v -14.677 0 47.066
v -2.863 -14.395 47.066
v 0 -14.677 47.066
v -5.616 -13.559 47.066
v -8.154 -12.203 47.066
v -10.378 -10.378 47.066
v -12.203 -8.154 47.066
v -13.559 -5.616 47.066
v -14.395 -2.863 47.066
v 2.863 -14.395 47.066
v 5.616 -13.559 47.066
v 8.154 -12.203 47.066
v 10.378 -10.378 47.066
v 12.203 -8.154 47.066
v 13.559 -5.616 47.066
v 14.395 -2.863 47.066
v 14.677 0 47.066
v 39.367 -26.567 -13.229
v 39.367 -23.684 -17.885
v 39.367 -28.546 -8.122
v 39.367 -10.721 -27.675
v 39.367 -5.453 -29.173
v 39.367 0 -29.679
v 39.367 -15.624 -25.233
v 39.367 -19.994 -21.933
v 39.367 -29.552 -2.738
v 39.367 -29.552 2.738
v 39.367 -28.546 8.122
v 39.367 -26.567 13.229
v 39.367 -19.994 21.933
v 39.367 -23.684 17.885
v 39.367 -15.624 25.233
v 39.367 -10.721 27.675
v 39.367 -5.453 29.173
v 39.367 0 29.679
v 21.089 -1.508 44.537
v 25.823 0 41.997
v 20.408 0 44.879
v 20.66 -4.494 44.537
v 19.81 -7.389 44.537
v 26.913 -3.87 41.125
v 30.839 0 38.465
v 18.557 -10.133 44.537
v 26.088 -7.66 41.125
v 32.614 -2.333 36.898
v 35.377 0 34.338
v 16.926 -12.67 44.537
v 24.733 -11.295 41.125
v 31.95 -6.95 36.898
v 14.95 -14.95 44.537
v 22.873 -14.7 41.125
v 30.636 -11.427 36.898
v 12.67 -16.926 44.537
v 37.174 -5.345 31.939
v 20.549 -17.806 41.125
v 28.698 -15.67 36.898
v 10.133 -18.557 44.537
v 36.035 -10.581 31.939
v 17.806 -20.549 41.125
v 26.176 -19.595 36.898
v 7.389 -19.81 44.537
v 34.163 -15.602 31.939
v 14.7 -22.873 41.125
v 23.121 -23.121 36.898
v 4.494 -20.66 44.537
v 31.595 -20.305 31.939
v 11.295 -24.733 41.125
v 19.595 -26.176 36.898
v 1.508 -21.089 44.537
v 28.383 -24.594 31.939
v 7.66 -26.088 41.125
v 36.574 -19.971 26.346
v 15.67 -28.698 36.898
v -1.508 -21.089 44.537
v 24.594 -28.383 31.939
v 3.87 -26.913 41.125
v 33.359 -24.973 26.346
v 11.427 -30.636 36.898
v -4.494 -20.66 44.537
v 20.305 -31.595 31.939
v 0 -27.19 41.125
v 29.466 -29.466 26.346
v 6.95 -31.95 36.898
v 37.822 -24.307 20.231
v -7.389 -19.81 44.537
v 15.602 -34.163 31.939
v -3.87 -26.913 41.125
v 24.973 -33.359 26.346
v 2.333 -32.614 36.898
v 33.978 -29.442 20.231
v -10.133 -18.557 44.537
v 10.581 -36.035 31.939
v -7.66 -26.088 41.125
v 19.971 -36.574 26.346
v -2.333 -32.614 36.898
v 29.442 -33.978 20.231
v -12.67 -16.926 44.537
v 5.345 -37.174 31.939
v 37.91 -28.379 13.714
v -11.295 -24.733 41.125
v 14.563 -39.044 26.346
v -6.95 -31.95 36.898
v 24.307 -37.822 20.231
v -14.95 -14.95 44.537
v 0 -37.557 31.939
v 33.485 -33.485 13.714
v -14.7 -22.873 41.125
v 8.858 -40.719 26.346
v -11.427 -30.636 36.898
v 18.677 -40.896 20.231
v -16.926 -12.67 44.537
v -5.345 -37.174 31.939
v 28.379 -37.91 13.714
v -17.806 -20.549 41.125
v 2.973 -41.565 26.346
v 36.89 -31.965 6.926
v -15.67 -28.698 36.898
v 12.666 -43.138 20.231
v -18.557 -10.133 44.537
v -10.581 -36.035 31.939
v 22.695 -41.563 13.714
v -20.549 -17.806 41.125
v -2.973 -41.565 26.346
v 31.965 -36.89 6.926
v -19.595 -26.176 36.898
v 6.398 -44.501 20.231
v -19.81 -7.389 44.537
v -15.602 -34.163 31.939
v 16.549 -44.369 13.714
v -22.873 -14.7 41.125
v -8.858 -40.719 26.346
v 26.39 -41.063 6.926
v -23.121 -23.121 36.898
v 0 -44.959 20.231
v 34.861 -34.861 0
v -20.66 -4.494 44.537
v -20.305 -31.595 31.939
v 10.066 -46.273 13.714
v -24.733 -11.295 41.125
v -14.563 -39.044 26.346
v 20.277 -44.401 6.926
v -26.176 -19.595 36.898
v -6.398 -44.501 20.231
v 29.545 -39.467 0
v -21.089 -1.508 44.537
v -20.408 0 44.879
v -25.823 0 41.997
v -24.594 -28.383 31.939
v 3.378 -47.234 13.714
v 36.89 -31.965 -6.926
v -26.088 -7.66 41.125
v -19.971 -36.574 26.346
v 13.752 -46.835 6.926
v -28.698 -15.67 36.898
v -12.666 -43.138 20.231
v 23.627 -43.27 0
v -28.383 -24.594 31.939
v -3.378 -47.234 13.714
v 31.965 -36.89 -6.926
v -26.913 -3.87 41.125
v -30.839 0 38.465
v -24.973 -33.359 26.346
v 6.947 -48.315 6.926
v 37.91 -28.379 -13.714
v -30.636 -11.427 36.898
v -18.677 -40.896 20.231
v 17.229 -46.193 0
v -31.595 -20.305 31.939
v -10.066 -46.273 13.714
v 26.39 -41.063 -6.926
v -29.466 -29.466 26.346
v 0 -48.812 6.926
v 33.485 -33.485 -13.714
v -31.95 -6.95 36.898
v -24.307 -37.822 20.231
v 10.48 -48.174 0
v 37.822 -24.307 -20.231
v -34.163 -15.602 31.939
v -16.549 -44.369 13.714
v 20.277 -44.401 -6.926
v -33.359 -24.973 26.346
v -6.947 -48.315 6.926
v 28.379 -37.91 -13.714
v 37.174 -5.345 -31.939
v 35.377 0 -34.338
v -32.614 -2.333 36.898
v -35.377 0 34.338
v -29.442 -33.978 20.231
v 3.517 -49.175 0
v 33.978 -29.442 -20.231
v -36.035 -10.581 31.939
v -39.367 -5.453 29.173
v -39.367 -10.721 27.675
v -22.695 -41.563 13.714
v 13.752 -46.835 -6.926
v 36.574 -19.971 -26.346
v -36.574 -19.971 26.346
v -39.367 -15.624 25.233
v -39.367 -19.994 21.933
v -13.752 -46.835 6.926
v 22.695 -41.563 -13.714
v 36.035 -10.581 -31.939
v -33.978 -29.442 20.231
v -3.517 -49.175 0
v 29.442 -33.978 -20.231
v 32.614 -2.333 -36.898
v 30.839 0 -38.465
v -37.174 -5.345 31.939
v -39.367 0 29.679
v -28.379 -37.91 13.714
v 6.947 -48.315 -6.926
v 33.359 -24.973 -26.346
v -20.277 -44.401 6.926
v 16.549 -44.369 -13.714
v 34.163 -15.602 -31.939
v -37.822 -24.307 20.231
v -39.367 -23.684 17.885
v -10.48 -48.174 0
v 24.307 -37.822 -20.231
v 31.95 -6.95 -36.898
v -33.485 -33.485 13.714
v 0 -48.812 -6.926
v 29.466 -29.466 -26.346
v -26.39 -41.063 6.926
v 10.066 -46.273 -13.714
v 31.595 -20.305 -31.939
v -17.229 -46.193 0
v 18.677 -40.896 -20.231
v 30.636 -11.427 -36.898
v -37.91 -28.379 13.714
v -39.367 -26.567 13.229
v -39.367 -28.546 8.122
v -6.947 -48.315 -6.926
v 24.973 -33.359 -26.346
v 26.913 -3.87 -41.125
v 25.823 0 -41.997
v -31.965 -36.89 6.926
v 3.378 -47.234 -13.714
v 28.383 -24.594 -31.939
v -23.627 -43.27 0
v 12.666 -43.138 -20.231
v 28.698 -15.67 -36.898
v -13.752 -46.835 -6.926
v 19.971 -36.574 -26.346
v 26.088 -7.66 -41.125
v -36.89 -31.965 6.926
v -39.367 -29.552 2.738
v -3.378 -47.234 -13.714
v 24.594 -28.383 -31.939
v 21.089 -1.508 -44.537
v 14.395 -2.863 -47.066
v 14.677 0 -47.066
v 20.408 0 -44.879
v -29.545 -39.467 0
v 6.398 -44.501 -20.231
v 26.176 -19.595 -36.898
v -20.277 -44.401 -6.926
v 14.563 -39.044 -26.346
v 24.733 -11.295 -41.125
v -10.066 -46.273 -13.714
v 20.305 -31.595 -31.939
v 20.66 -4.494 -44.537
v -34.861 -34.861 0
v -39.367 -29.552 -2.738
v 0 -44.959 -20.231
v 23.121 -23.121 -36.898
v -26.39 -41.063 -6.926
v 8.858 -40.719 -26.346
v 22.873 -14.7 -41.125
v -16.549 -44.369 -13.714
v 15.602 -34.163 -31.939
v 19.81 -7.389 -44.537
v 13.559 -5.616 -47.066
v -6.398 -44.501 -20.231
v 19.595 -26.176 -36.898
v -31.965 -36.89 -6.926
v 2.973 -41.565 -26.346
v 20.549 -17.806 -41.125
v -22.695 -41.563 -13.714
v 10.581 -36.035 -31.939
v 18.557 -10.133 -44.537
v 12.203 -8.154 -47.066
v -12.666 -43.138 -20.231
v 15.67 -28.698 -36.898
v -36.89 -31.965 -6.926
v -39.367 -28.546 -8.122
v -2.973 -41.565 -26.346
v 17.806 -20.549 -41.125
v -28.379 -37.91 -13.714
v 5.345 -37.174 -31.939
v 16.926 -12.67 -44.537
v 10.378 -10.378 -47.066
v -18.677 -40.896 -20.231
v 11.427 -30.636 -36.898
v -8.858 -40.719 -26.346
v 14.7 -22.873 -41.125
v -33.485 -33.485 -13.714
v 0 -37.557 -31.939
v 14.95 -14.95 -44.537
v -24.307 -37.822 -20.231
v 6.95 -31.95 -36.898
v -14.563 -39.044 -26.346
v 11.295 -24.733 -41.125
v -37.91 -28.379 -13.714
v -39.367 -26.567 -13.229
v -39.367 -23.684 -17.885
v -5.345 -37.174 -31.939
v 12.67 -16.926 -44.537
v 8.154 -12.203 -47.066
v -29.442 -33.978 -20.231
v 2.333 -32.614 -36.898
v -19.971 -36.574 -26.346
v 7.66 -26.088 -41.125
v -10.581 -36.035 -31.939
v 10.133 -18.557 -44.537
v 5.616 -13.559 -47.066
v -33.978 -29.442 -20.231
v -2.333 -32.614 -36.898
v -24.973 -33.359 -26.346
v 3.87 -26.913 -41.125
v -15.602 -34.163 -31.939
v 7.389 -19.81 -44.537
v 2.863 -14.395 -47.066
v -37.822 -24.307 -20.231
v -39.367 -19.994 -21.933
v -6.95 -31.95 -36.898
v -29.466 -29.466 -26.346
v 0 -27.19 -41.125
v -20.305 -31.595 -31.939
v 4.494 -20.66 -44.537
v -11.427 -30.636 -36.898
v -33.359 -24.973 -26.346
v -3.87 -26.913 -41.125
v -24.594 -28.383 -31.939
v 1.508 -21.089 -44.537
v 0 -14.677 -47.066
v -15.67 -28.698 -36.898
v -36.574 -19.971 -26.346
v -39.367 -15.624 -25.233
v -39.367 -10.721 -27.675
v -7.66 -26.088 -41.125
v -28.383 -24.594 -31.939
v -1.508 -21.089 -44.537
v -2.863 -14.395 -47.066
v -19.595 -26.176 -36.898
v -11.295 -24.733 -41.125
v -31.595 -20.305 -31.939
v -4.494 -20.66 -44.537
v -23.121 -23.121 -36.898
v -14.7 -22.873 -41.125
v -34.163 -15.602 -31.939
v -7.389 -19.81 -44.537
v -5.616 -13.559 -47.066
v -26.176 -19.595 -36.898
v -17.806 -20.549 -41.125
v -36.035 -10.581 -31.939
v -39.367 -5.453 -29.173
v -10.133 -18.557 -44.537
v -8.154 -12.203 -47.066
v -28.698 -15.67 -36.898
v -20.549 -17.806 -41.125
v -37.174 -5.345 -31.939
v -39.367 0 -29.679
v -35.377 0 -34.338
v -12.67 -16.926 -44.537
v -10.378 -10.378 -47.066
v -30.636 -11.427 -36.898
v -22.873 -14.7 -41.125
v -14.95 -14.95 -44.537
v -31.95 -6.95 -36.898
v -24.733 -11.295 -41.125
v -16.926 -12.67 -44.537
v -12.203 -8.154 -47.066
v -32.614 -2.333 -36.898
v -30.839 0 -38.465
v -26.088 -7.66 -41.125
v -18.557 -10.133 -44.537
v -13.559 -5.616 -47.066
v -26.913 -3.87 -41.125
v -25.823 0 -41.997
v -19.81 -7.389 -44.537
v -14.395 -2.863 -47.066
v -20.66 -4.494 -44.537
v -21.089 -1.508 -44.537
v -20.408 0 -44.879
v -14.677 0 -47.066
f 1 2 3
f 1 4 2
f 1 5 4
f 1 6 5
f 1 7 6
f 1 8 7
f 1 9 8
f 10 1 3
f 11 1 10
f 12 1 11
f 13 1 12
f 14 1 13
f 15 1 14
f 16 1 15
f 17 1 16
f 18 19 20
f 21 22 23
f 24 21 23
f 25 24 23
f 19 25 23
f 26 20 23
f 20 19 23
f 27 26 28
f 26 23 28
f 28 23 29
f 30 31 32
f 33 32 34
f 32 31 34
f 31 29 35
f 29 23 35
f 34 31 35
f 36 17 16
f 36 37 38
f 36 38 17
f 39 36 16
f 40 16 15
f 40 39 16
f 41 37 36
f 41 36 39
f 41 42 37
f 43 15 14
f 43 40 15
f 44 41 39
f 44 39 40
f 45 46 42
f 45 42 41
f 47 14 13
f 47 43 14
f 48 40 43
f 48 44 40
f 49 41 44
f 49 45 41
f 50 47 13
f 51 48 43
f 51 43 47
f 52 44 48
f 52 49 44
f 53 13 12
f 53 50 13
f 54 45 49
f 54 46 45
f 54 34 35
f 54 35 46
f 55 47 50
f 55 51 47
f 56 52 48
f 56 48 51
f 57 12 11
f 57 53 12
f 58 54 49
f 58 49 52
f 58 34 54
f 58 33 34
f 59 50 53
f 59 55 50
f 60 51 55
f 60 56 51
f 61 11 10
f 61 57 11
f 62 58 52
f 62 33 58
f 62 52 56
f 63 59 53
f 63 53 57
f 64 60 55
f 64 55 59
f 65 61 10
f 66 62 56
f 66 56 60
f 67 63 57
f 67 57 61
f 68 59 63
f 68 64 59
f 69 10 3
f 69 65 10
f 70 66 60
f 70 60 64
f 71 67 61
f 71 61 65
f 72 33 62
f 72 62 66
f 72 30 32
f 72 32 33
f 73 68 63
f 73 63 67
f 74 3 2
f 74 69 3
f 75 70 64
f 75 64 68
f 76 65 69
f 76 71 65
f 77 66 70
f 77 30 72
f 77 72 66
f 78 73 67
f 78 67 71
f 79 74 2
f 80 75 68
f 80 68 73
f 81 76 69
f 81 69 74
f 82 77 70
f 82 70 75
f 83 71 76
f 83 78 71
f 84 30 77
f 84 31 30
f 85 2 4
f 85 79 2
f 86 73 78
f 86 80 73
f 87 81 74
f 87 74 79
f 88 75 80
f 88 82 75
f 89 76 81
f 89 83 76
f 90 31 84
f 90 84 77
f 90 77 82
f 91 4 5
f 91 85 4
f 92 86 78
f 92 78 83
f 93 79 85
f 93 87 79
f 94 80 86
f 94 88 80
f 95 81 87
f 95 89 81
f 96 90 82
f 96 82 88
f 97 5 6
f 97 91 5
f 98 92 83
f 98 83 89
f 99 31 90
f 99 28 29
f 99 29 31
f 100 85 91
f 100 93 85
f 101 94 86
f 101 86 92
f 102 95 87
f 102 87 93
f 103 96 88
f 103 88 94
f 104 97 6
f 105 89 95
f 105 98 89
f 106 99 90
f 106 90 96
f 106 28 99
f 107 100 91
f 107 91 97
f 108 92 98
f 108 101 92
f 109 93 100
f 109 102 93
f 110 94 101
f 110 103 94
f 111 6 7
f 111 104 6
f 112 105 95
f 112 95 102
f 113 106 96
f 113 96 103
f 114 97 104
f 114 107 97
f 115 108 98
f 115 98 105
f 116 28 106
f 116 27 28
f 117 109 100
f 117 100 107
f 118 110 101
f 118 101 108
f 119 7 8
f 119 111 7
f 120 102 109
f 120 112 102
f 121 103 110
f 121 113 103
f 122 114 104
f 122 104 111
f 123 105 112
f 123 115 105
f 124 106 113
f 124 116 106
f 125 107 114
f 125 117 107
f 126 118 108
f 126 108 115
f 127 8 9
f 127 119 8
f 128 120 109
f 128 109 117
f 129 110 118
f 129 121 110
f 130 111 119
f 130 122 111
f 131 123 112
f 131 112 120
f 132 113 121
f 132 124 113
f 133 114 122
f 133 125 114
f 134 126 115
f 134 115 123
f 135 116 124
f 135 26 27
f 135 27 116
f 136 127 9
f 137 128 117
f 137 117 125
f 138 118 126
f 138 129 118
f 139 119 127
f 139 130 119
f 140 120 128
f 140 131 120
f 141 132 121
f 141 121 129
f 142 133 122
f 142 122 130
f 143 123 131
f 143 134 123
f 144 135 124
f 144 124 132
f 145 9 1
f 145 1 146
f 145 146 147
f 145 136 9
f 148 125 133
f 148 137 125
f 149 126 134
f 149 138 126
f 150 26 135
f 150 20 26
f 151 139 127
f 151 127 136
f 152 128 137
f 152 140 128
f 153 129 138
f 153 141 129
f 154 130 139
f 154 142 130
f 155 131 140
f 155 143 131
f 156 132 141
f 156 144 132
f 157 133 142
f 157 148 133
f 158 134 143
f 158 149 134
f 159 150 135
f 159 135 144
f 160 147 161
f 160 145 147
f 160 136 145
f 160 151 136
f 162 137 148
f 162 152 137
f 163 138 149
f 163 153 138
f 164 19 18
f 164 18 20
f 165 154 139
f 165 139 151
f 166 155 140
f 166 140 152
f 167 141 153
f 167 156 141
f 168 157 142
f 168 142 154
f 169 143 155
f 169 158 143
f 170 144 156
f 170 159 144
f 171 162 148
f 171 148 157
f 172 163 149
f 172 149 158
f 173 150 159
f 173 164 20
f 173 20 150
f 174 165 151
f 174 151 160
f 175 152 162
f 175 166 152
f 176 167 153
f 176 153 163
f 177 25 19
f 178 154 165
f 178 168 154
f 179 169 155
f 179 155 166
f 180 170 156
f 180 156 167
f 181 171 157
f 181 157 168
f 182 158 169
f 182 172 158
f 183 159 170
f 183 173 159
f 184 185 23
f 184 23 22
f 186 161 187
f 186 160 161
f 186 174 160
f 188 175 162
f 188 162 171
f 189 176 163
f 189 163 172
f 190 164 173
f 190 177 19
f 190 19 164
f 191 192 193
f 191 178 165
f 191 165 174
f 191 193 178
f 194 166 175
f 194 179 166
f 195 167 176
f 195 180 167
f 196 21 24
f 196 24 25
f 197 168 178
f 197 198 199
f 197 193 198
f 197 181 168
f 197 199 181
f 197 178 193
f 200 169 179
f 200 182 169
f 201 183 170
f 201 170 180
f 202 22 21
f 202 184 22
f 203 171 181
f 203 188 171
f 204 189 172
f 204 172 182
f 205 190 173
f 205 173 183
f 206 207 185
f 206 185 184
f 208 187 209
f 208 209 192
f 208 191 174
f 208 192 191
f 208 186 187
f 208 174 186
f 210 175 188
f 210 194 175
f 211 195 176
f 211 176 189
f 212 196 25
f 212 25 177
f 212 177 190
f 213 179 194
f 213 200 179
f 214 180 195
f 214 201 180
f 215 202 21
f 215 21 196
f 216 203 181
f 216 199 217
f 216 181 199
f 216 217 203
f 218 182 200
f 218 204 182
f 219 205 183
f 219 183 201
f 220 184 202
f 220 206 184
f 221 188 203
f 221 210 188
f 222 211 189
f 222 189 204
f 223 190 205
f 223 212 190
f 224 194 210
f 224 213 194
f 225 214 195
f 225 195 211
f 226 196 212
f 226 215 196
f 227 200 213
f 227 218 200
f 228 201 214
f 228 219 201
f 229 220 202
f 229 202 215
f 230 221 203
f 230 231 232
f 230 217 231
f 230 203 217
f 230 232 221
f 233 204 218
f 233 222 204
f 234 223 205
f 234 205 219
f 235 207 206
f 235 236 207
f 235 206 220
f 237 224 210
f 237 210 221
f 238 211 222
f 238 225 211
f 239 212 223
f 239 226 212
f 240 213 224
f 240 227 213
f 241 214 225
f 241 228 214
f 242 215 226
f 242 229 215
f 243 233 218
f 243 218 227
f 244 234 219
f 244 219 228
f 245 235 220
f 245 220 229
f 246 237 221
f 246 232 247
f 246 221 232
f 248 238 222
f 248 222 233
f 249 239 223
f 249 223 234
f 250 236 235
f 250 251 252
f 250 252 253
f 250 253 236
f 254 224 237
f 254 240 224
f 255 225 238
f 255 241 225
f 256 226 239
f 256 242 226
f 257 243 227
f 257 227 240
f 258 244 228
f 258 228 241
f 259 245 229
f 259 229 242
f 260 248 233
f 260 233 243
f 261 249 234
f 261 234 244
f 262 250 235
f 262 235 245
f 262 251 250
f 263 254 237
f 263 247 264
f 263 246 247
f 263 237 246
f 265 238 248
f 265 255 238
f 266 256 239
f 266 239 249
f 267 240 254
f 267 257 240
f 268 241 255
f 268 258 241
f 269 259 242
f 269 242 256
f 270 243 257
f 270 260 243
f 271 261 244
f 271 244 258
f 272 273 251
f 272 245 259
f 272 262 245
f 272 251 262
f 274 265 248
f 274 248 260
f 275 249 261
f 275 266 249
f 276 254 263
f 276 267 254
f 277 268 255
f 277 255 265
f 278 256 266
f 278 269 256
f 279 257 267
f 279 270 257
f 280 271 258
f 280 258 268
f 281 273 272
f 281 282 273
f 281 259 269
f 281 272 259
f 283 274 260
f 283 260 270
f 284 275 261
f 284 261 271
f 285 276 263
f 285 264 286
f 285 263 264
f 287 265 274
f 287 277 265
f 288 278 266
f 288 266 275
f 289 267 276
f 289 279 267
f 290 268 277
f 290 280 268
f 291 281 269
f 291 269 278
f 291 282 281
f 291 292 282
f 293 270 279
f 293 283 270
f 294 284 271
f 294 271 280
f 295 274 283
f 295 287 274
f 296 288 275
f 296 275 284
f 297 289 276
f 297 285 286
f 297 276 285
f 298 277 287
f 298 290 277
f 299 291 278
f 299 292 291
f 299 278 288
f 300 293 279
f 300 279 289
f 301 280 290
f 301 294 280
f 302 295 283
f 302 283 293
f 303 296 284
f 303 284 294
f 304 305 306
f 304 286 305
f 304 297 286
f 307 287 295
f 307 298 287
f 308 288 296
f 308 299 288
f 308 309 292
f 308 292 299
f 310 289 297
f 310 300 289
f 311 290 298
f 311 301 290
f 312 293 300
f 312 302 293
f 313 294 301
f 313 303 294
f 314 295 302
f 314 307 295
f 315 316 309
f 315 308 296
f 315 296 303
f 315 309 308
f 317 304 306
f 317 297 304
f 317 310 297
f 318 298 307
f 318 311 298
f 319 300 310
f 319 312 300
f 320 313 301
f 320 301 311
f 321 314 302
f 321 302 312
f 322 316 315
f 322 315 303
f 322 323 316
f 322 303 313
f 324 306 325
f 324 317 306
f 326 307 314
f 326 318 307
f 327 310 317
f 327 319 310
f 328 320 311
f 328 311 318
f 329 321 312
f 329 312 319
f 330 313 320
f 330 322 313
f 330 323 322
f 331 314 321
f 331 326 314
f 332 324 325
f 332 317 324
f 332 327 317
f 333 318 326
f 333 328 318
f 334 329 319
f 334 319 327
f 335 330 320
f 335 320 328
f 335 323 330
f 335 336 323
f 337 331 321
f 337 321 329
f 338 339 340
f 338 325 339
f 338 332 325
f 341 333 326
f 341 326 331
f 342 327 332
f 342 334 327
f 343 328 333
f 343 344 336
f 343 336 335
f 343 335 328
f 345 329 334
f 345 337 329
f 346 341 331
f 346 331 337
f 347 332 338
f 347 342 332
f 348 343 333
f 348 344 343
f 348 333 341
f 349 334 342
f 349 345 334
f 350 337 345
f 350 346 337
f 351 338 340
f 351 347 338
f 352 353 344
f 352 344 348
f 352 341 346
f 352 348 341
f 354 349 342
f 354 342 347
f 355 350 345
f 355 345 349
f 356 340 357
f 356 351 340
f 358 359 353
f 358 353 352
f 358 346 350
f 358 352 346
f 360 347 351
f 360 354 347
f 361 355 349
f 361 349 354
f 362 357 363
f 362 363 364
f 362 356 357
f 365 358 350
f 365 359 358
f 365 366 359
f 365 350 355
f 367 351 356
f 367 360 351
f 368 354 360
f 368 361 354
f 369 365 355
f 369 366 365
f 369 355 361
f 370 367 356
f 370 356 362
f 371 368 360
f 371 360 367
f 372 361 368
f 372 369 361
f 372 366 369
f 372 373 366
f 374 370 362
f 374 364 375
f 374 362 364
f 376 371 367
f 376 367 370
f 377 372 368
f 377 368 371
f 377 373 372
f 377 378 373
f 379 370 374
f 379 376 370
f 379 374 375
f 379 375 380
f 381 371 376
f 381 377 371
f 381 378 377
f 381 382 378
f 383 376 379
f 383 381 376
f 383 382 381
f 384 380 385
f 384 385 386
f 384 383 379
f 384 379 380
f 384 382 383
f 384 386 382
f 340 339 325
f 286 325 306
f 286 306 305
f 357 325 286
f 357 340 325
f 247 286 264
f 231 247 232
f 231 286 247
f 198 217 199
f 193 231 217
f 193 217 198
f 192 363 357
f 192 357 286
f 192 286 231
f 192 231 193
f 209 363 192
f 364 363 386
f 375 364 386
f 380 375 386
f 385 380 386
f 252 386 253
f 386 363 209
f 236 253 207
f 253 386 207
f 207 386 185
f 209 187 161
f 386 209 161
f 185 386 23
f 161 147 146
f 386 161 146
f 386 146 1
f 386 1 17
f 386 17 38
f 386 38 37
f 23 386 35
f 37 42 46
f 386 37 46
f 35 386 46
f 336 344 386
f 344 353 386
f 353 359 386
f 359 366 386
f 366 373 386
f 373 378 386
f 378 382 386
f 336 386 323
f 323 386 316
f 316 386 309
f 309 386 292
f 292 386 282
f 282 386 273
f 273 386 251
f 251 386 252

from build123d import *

# Parameters (mm, degrees)
F0_W     = 78.734032
F0_H     = 94.131536
F1_DEPTH = 85.5


with BuildPart() as f1:
    # F0 (on Front) → F1 (new body)
    with BuildSketch(Plane.XZ):
        Rectangle(F0_W, F0_H)
    extrude(amount=F1_DEPTH)


with BuildPart() as f3:
    # F2 (on Front) → F3 (revolve)
    with BuildSketch(Plane.XZ):
        with BuildLine():
            Line((0, 0), (0, 49.300977))
            ThreePointArc((0, 49.300977), (-49.300977, 0), (0, -49.300977))
            Line((0, -49.300977), (0, 0))
        make_face()
    revolve(axis=Axis((0, 0, 0), (0, 0, -1)))


with BuildPart() as f1_1:
    add(f1.part)

    # F4: intersect F3
    add(f3.part, mode=Mode.INTERSECT)


solid = f1_1.part
